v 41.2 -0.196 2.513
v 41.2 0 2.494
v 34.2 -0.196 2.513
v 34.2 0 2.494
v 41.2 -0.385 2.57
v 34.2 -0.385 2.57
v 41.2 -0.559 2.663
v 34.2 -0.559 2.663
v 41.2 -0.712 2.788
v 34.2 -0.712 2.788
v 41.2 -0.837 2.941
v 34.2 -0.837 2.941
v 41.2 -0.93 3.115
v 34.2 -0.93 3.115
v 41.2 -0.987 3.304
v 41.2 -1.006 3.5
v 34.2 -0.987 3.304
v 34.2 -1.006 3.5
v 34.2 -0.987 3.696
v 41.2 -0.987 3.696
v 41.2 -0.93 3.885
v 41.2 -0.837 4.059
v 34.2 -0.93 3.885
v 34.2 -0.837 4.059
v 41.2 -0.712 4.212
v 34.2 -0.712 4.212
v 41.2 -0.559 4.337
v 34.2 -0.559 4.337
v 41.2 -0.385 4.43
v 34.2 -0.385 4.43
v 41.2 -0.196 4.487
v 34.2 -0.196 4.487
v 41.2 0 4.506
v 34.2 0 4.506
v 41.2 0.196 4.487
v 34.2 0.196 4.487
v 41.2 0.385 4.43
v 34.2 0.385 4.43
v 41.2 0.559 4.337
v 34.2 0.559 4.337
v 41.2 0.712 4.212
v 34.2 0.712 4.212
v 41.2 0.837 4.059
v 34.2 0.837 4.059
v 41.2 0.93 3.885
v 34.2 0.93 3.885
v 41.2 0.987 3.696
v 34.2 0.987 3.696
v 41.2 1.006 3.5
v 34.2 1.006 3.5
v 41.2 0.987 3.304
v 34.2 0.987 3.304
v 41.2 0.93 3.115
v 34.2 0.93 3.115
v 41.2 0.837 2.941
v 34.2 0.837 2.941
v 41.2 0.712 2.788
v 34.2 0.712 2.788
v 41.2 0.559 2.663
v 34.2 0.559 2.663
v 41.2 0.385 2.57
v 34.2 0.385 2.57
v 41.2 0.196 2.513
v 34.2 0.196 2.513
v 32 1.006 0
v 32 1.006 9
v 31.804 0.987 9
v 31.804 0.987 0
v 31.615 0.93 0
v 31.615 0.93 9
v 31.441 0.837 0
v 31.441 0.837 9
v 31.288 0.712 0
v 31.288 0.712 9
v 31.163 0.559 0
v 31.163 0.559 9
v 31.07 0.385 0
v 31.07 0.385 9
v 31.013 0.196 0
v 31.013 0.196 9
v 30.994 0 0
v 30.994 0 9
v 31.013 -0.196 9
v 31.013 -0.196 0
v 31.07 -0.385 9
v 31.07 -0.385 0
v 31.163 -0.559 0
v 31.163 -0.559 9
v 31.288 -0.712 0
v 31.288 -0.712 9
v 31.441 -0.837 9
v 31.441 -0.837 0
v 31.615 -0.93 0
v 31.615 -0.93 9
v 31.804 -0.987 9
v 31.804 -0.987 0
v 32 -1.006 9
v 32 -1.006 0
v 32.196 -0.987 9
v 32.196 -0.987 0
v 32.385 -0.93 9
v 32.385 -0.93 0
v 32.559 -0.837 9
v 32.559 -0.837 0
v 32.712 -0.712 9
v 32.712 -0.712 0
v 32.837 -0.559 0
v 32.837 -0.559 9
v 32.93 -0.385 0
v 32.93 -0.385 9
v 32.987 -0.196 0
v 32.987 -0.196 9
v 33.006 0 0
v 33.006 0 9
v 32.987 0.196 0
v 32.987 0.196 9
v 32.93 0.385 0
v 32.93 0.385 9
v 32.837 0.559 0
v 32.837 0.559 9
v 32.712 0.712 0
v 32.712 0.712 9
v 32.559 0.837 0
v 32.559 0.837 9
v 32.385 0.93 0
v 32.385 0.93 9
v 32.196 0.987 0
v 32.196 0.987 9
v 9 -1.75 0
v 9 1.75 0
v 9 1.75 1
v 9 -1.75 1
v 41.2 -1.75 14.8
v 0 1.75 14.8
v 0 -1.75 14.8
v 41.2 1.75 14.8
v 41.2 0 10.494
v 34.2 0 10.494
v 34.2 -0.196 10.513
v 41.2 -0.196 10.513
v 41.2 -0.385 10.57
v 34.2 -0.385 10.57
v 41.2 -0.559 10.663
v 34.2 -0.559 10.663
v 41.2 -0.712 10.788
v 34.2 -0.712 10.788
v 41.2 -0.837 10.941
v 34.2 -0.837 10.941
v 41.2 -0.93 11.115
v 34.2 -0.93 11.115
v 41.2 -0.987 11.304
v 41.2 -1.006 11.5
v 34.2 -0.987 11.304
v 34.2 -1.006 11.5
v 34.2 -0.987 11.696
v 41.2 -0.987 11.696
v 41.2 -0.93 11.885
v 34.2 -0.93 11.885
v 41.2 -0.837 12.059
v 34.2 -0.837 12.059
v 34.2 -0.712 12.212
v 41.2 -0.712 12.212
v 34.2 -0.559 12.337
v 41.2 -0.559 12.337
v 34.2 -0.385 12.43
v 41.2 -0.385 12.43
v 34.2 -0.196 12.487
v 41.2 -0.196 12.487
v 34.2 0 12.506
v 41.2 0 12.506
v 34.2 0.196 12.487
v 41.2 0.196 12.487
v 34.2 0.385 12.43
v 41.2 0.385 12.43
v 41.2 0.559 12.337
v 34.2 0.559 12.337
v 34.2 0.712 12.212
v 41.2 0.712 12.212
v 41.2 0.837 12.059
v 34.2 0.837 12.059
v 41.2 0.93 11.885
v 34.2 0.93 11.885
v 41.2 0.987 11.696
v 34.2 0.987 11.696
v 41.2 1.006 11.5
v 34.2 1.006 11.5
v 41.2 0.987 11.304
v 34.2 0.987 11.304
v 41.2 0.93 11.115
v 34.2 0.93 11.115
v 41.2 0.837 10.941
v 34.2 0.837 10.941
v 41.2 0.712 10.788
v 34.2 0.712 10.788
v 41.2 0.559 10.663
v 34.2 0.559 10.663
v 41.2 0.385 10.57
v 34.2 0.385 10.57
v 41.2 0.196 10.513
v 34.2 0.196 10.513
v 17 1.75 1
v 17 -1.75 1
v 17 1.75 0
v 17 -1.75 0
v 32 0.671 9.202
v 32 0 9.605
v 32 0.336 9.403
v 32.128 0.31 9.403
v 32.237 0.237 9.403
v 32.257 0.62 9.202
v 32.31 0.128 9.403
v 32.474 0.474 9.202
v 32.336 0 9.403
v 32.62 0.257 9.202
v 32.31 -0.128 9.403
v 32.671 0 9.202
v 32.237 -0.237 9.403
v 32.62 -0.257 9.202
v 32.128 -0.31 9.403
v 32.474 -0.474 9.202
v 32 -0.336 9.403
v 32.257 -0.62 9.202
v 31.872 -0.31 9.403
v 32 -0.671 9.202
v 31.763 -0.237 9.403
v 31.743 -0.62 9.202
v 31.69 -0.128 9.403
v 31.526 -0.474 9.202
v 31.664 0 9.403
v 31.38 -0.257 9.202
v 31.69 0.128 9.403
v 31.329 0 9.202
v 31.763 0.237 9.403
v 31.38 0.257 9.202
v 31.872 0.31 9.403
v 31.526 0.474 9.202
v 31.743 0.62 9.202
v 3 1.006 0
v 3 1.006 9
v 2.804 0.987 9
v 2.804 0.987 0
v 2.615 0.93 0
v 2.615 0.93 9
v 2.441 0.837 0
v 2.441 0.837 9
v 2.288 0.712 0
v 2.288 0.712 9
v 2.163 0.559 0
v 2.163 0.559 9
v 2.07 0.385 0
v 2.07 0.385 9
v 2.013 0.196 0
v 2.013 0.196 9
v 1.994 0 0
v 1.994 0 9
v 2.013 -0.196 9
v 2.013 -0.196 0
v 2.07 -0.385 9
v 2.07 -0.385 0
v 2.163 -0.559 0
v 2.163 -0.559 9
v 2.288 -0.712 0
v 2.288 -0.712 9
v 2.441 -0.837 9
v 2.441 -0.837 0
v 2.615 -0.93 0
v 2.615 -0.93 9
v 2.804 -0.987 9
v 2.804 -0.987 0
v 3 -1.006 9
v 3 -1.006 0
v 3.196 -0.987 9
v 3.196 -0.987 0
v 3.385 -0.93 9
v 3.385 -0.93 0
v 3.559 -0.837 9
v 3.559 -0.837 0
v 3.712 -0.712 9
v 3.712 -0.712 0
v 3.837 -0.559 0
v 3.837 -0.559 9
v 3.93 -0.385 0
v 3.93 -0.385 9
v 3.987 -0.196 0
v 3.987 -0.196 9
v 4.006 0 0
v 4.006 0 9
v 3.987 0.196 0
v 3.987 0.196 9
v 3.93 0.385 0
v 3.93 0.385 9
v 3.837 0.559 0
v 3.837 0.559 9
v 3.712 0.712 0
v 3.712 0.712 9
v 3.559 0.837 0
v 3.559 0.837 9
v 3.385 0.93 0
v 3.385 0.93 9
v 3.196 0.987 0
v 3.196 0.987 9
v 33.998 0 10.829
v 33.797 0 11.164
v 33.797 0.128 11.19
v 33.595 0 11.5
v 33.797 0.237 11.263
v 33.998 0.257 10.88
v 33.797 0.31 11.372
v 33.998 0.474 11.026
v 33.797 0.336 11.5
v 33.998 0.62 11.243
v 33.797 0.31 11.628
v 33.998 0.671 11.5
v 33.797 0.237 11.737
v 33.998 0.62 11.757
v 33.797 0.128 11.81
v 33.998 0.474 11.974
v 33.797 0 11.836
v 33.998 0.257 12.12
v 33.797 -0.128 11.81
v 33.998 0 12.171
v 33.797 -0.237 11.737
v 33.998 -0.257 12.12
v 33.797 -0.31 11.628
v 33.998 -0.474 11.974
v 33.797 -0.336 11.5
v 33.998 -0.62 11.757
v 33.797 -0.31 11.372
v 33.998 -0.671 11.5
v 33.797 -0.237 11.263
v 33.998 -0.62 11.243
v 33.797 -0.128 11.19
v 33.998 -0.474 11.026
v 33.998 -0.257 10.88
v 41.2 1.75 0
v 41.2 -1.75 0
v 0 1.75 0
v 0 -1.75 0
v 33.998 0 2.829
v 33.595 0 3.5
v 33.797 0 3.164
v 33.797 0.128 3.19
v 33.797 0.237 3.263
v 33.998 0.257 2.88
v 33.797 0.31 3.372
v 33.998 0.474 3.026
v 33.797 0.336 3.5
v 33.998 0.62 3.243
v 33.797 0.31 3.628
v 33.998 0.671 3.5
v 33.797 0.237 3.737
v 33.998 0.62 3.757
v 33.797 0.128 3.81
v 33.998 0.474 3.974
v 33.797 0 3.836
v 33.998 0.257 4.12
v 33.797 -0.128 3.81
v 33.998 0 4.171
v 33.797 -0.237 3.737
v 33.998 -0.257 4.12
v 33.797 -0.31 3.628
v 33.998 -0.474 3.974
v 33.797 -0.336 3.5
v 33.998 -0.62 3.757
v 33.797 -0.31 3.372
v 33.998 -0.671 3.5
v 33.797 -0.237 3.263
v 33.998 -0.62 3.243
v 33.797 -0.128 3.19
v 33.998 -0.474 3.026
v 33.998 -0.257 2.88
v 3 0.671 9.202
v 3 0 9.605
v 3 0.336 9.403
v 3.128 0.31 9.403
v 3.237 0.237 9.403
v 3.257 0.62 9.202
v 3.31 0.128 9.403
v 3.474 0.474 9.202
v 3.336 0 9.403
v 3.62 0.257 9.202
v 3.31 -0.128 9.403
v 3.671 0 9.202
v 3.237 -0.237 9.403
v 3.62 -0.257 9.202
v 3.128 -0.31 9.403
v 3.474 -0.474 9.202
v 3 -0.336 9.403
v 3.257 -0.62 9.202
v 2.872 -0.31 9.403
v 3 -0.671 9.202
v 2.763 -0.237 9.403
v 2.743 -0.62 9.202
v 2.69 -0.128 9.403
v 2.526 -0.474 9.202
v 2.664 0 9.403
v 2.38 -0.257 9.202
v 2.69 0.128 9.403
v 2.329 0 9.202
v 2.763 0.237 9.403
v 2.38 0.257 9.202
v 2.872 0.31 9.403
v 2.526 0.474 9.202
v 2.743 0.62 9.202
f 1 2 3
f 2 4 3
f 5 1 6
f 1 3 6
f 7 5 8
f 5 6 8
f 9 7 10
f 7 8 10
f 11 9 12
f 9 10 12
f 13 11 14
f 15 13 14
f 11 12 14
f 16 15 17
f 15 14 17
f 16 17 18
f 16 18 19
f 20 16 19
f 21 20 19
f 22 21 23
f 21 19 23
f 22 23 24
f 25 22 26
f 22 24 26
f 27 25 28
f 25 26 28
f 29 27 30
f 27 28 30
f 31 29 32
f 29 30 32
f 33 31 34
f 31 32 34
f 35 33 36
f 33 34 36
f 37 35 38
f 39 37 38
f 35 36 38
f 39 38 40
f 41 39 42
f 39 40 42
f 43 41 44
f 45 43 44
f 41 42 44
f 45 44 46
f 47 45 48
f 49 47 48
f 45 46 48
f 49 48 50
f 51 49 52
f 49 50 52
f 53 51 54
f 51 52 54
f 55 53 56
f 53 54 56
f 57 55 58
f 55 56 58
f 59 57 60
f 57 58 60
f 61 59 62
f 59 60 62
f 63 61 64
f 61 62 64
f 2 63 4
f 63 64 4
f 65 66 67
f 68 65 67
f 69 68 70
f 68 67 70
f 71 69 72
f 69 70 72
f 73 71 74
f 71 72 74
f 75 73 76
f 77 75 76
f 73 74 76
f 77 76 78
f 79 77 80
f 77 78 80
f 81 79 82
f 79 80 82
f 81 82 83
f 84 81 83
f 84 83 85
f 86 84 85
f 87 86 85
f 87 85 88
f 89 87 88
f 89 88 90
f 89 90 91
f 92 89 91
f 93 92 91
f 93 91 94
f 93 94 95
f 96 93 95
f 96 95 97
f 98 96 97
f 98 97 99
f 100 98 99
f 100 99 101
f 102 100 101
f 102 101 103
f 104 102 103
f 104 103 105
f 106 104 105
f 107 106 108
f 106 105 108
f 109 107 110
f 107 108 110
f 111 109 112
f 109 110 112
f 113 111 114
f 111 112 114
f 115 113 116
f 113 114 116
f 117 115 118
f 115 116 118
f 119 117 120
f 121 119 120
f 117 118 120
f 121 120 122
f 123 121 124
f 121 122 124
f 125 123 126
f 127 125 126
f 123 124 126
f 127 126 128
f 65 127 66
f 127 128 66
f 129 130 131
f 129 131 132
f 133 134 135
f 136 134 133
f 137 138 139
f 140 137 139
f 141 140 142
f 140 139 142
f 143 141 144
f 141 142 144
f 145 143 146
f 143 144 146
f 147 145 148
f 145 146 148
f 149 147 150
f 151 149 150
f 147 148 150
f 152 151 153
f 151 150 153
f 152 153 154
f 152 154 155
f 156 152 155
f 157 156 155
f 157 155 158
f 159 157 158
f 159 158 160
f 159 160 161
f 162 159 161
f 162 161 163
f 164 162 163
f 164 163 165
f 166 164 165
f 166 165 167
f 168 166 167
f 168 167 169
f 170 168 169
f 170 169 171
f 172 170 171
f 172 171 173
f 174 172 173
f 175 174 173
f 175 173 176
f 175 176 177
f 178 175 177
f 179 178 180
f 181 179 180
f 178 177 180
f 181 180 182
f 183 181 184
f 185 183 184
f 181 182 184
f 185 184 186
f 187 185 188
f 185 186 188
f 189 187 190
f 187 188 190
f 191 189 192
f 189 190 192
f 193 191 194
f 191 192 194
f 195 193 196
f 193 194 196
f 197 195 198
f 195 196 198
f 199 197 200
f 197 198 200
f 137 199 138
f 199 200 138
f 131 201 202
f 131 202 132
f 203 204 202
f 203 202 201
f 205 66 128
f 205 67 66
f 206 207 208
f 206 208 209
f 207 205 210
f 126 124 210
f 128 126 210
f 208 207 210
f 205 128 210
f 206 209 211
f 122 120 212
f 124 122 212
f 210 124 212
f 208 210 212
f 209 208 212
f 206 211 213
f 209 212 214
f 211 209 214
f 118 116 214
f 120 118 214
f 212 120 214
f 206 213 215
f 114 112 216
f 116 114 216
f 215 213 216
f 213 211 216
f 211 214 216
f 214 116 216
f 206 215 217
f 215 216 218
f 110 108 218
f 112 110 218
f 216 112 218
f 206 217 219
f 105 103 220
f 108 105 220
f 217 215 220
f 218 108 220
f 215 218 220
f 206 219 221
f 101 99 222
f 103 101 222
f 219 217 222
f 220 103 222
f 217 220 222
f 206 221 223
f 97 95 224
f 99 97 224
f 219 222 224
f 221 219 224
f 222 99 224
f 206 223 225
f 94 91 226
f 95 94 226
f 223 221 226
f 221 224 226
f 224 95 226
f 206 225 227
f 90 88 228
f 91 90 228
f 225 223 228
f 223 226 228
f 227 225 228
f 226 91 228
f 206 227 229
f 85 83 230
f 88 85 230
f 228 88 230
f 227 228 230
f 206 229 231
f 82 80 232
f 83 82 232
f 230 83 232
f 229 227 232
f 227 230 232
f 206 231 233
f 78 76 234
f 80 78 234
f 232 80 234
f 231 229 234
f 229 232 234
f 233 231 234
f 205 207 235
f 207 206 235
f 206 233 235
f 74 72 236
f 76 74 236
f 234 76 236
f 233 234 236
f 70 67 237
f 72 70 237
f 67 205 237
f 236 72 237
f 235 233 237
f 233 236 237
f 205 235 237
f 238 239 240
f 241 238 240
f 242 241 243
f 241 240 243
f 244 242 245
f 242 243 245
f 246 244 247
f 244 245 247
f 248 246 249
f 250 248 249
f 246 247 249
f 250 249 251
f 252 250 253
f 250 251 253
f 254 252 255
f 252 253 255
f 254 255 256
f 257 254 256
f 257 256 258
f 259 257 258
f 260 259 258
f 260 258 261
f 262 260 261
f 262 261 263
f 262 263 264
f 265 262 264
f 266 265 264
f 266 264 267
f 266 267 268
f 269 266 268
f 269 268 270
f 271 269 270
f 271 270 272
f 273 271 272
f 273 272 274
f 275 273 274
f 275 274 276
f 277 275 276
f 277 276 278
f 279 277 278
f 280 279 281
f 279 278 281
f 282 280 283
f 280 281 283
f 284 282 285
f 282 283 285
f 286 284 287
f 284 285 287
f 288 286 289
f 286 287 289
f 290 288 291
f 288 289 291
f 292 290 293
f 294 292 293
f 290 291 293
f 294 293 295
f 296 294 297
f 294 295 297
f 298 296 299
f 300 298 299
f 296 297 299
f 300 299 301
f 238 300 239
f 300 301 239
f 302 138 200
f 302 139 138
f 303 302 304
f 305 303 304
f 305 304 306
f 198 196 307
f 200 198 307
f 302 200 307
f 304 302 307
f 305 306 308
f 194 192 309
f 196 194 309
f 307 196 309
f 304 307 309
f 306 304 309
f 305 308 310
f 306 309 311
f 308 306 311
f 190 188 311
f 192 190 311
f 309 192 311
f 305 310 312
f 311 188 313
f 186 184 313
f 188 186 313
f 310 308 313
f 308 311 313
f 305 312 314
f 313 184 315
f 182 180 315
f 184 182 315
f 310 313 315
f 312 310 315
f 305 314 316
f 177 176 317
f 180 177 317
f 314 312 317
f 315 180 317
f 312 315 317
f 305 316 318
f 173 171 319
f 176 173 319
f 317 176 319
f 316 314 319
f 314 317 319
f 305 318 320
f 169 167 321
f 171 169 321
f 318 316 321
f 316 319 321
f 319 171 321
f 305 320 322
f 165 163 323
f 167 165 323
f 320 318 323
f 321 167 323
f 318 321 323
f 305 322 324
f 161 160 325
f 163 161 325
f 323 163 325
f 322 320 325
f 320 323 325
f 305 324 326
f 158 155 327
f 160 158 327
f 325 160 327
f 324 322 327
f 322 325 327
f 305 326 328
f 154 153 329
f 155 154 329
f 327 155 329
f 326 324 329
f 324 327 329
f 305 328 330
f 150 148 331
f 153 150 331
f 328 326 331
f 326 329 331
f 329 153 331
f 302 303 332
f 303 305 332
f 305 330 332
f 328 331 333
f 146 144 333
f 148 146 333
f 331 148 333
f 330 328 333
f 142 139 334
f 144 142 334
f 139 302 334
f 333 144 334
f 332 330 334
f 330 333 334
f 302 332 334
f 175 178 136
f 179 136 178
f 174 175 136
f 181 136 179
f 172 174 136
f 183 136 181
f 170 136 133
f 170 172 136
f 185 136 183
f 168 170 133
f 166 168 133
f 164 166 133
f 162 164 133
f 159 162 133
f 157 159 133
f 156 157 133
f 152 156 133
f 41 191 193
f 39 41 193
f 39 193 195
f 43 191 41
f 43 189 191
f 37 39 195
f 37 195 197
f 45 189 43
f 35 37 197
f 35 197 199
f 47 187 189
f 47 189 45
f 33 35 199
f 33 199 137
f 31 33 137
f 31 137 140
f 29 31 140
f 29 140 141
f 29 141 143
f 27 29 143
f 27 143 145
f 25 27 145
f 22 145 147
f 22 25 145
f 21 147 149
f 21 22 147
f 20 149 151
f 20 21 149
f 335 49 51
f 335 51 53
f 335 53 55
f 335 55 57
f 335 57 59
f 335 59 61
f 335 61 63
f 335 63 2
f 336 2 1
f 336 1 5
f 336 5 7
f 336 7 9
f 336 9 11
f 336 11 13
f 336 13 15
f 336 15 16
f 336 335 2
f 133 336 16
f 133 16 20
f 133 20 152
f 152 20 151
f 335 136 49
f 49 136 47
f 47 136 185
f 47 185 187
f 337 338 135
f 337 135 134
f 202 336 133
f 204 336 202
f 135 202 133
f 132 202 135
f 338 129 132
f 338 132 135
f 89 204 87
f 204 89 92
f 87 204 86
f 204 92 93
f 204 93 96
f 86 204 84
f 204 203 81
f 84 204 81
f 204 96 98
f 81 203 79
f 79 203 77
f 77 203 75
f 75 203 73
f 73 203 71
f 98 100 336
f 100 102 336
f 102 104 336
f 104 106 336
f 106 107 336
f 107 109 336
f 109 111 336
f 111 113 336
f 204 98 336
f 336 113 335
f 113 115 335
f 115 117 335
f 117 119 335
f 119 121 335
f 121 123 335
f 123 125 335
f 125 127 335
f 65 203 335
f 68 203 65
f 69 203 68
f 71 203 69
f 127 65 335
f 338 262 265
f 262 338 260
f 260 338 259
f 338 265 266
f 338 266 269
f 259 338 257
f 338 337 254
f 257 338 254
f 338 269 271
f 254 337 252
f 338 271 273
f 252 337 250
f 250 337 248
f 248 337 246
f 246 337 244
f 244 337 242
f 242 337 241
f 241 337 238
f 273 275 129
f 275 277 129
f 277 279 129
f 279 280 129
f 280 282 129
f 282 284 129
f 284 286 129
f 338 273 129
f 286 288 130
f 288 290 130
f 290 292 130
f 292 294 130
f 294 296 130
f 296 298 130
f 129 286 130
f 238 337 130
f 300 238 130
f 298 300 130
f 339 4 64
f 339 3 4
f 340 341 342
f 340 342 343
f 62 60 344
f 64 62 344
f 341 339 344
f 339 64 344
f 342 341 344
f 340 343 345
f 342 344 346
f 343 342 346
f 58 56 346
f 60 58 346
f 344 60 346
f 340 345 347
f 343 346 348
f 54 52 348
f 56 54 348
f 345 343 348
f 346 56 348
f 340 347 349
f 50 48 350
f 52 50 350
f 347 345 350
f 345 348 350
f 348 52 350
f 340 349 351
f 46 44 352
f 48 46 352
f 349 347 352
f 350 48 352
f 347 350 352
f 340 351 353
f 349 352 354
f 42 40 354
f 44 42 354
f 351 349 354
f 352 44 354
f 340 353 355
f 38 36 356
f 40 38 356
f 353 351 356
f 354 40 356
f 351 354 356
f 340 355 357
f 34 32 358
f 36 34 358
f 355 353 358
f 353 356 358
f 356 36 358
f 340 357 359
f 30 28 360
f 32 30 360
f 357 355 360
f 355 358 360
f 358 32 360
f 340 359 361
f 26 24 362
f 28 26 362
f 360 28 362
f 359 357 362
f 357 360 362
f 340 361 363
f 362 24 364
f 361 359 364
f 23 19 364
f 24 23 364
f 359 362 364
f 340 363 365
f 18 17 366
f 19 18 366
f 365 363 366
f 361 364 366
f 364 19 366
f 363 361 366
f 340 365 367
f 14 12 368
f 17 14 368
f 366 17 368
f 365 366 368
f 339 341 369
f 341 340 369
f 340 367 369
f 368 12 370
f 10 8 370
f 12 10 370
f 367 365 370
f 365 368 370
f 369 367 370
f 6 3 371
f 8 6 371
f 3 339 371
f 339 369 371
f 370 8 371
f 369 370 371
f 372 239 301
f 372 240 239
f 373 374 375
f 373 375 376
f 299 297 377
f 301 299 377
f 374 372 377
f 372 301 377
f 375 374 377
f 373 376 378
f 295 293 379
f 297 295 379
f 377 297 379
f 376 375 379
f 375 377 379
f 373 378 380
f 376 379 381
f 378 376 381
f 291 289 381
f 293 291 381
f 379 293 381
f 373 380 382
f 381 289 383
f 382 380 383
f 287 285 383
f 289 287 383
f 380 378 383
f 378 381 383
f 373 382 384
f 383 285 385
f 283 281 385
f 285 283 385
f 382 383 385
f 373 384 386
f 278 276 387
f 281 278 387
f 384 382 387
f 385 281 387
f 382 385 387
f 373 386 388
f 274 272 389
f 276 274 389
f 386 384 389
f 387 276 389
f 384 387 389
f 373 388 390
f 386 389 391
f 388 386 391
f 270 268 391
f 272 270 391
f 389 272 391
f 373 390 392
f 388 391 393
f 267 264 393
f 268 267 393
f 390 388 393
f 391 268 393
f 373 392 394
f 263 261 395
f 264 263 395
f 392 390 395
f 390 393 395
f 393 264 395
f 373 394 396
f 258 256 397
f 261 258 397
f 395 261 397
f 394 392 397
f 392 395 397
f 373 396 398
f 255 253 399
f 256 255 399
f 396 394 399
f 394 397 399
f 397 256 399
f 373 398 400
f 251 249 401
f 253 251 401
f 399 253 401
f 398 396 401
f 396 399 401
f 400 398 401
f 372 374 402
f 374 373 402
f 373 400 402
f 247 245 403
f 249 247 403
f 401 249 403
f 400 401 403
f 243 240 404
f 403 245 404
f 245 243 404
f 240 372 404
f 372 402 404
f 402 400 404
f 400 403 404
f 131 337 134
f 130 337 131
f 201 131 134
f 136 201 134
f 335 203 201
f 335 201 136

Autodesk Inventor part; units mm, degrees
ref_plane "YZ Plane" through (0, 0, 0) normal (1, 0, 0) x (0, 1, 0)
ref_plane "XZ Plane" through (0, 0, 0) normal (0, 1, 0) x (-1, 0, 0)
sketch "Skizze1" plane through (0, 0, 0) normal (0, 0, 1) x (1, 0, 0)
  line L0 (0, 1.75) -> (41.2, 1.75)
  line L1 (41.2, 1.75) -> (41.2, -1.75)
  line L2 (41.2, -1.75) -> (0, -1.75)
  line L3 (0, -1.75) -> (0, 1.75)
  point P0 (0, 0)
  point P1 (0, 0)
  dimension "d0" = 41.2
  dimension "d1" = 3.5
extrude "Extrusion1" add sketch "Skizze1" along normal blind 14.8
sketch "Skizze2" plane through (0, 0, 0) normal (0, 0, -1) x (-1, 0, 0)
  line L0 (0, 0) -> (-3, 0) construction
  line L1 (-3, 0) -> (-32, 0) construction
  dimension "d4" = 3
  dimension "d5" = 32
hole "Bohrung1" at (3, 0, 0) at (32, 0, 0) direction (0, 0, 1) diameter 2.013 depth 9 tip angle 118 thread size "M2.5x0.45" class "6H" standard "ISO Metric profile"
sketch "Skizze3" plane through (0, 0, 0) normal (0, 0, -1) x (-1, 0, 0)
  circle A0 centre (-3, 0) radius 1.0065 projected
  circle A1 centre (-32, 0) radius 1.0065 projected
  line L0 (0, 1.75) -> (-41.2, 1.75) projected
  line L1 (-41.2, 1.75) -> (-41.2, -1.75) projected
  line L2 (-41.2, -1.75) -> (0, -1.75) projected
  line L3 (0, -1.75) -> (0, 1.75) projected
  line L4 (-41.2, -1.75) -> (0, -1.75) projected
  line L5 (-9, -1.75) -> (-17, -1.75)
  line L6 (-17, -1.75) -> (-17, 1.75)
  line L7 (-17, 1.75) -> (-9, 1.75)
  line L8 (-9, 1.75) -> (-9, -1.75)
  line L9 (-17, 0) -> (-9, 0) construction
  point P0 (0, 0)
  point P1 (-13, 0)
  dimension "d13" = 13
  dimension "d14" = 8
extrude "Extrusion2" cut sketch "Skizze3" against normal blind 1 contours L8 L2 L6 L0
sketch "Skizze4" plane through (41.2, -1.75, 0) normal (1, 0, 0) x (0, 0, -1)
  line L0 (0, 1.75) -> (-3.5, 1.75) construction
  line L1 (-3.5, 1.75) -> (-11.5, 1.75) construction
  dimension "d17" = 3.5
  dimension "d19" = 8
hole "Bohrung2" at (41.2, 0, 11.5) at (41.2, 0, 3.5) direction (-1, 0, 0) diameter 2.013 depth 7 tip angle 118 thread size "M2.5x0.45" class "6H" standard "ISO Metric profile"
ref_plane "Arbeitsebene1" through (0, 0, 7.4) normal (0, 0, 1) x (1, 0, 0)
properties part number "USB Wärmeableiter 1"
